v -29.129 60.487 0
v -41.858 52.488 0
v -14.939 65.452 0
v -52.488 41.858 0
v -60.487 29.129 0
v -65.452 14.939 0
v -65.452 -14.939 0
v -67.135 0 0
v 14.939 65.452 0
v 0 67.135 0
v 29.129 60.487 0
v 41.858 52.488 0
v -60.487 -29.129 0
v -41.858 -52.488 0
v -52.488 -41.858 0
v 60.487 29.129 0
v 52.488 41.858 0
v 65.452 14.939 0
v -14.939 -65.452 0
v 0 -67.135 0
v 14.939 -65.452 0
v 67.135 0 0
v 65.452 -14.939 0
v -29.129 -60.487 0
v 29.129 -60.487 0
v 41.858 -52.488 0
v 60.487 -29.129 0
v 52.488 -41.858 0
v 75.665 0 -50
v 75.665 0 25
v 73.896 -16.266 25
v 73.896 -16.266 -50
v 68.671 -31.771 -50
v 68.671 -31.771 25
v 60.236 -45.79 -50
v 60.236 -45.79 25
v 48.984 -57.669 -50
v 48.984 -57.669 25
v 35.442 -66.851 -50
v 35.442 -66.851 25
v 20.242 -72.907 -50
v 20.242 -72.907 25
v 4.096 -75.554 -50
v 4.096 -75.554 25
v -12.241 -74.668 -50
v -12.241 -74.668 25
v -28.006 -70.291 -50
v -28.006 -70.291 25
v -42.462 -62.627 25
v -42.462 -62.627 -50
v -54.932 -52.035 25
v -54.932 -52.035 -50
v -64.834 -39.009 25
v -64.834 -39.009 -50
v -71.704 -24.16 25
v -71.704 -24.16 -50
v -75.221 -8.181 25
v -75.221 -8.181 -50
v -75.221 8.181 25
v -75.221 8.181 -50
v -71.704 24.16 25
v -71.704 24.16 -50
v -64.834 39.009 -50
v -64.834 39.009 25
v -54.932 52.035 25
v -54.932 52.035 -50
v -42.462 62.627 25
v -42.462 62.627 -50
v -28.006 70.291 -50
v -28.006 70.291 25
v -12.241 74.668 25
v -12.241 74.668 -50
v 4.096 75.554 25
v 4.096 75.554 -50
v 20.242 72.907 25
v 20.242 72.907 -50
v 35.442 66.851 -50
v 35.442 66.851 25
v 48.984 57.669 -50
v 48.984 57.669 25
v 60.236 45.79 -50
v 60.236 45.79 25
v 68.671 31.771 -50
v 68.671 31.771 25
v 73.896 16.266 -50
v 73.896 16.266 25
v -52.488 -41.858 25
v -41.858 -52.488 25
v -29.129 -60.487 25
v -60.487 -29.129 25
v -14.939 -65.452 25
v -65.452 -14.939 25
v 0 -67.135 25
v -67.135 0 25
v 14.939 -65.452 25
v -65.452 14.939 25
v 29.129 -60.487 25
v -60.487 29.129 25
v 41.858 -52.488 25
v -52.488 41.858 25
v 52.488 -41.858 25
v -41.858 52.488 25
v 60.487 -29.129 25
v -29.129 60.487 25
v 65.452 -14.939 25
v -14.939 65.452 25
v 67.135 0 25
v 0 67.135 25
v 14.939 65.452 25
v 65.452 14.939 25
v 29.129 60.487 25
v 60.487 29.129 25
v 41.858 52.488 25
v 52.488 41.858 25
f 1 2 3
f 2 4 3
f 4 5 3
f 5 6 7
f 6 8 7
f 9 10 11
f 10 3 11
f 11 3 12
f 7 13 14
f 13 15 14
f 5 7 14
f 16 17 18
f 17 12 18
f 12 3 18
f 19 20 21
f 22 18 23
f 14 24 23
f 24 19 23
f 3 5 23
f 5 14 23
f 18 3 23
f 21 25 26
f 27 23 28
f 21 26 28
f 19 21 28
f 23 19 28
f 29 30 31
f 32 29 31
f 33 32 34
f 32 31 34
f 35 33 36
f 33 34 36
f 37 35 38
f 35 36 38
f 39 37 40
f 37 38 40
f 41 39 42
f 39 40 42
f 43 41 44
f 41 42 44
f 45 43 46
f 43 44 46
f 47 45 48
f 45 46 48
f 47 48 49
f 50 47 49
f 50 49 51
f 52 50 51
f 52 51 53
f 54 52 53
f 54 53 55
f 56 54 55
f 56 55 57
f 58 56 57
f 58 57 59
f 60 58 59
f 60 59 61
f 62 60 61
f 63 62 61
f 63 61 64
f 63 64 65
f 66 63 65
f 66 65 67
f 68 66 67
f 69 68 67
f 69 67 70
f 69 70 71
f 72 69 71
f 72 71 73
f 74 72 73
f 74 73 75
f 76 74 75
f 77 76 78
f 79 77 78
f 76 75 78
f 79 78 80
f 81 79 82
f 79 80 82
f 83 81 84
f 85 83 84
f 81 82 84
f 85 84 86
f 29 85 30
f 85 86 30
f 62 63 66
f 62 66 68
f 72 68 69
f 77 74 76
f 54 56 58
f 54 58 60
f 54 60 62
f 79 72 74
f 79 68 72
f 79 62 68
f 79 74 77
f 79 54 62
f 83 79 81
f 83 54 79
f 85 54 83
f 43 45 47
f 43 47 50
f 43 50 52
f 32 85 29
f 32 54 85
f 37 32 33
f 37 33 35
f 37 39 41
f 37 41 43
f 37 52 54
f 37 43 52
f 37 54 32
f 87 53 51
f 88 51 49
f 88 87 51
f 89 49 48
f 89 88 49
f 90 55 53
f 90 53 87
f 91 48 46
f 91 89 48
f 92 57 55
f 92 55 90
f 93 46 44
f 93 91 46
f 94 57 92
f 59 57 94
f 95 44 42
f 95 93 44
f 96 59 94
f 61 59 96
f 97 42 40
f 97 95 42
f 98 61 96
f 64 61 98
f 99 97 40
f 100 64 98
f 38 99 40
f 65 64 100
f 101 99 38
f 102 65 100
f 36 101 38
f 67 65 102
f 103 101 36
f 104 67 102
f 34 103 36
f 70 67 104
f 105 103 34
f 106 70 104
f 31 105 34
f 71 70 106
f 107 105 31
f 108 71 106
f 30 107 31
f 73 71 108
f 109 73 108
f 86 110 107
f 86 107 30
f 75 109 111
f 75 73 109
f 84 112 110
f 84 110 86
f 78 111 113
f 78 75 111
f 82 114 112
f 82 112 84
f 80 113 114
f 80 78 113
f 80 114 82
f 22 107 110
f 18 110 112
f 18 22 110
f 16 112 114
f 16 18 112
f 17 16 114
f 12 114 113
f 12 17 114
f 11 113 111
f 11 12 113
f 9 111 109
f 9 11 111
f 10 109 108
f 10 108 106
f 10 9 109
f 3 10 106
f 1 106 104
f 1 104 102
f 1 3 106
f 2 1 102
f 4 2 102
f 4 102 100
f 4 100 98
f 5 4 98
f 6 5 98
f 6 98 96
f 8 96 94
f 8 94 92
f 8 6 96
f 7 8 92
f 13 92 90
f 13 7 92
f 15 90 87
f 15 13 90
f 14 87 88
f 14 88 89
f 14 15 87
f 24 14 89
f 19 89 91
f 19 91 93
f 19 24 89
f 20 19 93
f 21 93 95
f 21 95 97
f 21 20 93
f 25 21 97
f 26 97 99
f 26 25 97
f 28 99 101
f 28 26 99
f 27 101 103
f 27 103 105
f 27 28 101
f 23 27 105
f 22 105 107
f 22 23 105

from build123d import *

# Parameters (mm, degrees)
F0_R         = 75.6647788215
F0_R_2       = 67.1352595914
F1_DEPTH     = 25
F2_DEPTH     = 25
F1_FACE_R    = 75.6647788215
F1_FACE_R_2  = 67.1352595914
F1_FACE1_R   = 75.6647788215
F1_FACE1_R_2 = 67.1352595914
F3_R         = 75.5867204447
F3_R_2       = 67.1352595914
F4_DEPTH     = 50


with BuildPart() as f1:
    # F0 (on Top) → F1 (new body)
    with BuildSketch(Plane.XY):
        Circle(F0_R)
        Circle(F0_R_2, mode=Mode.SUBTRACT)
    extrude(amount=F1_DEPTH)

    # F0 (on Top) → F2 (join)
    with BuildSketch(Plane.XY):
        Circle(F0_R)
        Circle(F0_R_2, mode=Mode.SUBTRACT)
    extrude(amount=F2_DEPTH)

    # F1_face (on face) + F1_face1 (on face) + F3 (on face) → F4 (join)
    with BuildSketch(Plane(origin=(0, 0, 0), x_dir=(1, 0, 0), z_dir=(0, 0, -1))):
        Circle(F1_FACE_R)
        Circle(F1_FACE_R_2, mode=Mode.SUBTRACT)
    with BuildSketch(Plane.XY.offset(25)):
        Circle(F1_FACE1_R)
        Circle(F1_FACE1_R_2, mode=Mode.SUBTRACT)
    with BuildSketch(Plane(origin=(0, 0, 0), x_dir=(1, 0, 0), z_dir=(0, 0, -1))):
        Circle(F3_R)
        Circle(F3_R_2, mode=Mode.SUBTRACT)
        Circle(F3_R_2)
    extrude(amount=F4_DEPTH, dir=(0, 0, -1))


solid = f1.part
